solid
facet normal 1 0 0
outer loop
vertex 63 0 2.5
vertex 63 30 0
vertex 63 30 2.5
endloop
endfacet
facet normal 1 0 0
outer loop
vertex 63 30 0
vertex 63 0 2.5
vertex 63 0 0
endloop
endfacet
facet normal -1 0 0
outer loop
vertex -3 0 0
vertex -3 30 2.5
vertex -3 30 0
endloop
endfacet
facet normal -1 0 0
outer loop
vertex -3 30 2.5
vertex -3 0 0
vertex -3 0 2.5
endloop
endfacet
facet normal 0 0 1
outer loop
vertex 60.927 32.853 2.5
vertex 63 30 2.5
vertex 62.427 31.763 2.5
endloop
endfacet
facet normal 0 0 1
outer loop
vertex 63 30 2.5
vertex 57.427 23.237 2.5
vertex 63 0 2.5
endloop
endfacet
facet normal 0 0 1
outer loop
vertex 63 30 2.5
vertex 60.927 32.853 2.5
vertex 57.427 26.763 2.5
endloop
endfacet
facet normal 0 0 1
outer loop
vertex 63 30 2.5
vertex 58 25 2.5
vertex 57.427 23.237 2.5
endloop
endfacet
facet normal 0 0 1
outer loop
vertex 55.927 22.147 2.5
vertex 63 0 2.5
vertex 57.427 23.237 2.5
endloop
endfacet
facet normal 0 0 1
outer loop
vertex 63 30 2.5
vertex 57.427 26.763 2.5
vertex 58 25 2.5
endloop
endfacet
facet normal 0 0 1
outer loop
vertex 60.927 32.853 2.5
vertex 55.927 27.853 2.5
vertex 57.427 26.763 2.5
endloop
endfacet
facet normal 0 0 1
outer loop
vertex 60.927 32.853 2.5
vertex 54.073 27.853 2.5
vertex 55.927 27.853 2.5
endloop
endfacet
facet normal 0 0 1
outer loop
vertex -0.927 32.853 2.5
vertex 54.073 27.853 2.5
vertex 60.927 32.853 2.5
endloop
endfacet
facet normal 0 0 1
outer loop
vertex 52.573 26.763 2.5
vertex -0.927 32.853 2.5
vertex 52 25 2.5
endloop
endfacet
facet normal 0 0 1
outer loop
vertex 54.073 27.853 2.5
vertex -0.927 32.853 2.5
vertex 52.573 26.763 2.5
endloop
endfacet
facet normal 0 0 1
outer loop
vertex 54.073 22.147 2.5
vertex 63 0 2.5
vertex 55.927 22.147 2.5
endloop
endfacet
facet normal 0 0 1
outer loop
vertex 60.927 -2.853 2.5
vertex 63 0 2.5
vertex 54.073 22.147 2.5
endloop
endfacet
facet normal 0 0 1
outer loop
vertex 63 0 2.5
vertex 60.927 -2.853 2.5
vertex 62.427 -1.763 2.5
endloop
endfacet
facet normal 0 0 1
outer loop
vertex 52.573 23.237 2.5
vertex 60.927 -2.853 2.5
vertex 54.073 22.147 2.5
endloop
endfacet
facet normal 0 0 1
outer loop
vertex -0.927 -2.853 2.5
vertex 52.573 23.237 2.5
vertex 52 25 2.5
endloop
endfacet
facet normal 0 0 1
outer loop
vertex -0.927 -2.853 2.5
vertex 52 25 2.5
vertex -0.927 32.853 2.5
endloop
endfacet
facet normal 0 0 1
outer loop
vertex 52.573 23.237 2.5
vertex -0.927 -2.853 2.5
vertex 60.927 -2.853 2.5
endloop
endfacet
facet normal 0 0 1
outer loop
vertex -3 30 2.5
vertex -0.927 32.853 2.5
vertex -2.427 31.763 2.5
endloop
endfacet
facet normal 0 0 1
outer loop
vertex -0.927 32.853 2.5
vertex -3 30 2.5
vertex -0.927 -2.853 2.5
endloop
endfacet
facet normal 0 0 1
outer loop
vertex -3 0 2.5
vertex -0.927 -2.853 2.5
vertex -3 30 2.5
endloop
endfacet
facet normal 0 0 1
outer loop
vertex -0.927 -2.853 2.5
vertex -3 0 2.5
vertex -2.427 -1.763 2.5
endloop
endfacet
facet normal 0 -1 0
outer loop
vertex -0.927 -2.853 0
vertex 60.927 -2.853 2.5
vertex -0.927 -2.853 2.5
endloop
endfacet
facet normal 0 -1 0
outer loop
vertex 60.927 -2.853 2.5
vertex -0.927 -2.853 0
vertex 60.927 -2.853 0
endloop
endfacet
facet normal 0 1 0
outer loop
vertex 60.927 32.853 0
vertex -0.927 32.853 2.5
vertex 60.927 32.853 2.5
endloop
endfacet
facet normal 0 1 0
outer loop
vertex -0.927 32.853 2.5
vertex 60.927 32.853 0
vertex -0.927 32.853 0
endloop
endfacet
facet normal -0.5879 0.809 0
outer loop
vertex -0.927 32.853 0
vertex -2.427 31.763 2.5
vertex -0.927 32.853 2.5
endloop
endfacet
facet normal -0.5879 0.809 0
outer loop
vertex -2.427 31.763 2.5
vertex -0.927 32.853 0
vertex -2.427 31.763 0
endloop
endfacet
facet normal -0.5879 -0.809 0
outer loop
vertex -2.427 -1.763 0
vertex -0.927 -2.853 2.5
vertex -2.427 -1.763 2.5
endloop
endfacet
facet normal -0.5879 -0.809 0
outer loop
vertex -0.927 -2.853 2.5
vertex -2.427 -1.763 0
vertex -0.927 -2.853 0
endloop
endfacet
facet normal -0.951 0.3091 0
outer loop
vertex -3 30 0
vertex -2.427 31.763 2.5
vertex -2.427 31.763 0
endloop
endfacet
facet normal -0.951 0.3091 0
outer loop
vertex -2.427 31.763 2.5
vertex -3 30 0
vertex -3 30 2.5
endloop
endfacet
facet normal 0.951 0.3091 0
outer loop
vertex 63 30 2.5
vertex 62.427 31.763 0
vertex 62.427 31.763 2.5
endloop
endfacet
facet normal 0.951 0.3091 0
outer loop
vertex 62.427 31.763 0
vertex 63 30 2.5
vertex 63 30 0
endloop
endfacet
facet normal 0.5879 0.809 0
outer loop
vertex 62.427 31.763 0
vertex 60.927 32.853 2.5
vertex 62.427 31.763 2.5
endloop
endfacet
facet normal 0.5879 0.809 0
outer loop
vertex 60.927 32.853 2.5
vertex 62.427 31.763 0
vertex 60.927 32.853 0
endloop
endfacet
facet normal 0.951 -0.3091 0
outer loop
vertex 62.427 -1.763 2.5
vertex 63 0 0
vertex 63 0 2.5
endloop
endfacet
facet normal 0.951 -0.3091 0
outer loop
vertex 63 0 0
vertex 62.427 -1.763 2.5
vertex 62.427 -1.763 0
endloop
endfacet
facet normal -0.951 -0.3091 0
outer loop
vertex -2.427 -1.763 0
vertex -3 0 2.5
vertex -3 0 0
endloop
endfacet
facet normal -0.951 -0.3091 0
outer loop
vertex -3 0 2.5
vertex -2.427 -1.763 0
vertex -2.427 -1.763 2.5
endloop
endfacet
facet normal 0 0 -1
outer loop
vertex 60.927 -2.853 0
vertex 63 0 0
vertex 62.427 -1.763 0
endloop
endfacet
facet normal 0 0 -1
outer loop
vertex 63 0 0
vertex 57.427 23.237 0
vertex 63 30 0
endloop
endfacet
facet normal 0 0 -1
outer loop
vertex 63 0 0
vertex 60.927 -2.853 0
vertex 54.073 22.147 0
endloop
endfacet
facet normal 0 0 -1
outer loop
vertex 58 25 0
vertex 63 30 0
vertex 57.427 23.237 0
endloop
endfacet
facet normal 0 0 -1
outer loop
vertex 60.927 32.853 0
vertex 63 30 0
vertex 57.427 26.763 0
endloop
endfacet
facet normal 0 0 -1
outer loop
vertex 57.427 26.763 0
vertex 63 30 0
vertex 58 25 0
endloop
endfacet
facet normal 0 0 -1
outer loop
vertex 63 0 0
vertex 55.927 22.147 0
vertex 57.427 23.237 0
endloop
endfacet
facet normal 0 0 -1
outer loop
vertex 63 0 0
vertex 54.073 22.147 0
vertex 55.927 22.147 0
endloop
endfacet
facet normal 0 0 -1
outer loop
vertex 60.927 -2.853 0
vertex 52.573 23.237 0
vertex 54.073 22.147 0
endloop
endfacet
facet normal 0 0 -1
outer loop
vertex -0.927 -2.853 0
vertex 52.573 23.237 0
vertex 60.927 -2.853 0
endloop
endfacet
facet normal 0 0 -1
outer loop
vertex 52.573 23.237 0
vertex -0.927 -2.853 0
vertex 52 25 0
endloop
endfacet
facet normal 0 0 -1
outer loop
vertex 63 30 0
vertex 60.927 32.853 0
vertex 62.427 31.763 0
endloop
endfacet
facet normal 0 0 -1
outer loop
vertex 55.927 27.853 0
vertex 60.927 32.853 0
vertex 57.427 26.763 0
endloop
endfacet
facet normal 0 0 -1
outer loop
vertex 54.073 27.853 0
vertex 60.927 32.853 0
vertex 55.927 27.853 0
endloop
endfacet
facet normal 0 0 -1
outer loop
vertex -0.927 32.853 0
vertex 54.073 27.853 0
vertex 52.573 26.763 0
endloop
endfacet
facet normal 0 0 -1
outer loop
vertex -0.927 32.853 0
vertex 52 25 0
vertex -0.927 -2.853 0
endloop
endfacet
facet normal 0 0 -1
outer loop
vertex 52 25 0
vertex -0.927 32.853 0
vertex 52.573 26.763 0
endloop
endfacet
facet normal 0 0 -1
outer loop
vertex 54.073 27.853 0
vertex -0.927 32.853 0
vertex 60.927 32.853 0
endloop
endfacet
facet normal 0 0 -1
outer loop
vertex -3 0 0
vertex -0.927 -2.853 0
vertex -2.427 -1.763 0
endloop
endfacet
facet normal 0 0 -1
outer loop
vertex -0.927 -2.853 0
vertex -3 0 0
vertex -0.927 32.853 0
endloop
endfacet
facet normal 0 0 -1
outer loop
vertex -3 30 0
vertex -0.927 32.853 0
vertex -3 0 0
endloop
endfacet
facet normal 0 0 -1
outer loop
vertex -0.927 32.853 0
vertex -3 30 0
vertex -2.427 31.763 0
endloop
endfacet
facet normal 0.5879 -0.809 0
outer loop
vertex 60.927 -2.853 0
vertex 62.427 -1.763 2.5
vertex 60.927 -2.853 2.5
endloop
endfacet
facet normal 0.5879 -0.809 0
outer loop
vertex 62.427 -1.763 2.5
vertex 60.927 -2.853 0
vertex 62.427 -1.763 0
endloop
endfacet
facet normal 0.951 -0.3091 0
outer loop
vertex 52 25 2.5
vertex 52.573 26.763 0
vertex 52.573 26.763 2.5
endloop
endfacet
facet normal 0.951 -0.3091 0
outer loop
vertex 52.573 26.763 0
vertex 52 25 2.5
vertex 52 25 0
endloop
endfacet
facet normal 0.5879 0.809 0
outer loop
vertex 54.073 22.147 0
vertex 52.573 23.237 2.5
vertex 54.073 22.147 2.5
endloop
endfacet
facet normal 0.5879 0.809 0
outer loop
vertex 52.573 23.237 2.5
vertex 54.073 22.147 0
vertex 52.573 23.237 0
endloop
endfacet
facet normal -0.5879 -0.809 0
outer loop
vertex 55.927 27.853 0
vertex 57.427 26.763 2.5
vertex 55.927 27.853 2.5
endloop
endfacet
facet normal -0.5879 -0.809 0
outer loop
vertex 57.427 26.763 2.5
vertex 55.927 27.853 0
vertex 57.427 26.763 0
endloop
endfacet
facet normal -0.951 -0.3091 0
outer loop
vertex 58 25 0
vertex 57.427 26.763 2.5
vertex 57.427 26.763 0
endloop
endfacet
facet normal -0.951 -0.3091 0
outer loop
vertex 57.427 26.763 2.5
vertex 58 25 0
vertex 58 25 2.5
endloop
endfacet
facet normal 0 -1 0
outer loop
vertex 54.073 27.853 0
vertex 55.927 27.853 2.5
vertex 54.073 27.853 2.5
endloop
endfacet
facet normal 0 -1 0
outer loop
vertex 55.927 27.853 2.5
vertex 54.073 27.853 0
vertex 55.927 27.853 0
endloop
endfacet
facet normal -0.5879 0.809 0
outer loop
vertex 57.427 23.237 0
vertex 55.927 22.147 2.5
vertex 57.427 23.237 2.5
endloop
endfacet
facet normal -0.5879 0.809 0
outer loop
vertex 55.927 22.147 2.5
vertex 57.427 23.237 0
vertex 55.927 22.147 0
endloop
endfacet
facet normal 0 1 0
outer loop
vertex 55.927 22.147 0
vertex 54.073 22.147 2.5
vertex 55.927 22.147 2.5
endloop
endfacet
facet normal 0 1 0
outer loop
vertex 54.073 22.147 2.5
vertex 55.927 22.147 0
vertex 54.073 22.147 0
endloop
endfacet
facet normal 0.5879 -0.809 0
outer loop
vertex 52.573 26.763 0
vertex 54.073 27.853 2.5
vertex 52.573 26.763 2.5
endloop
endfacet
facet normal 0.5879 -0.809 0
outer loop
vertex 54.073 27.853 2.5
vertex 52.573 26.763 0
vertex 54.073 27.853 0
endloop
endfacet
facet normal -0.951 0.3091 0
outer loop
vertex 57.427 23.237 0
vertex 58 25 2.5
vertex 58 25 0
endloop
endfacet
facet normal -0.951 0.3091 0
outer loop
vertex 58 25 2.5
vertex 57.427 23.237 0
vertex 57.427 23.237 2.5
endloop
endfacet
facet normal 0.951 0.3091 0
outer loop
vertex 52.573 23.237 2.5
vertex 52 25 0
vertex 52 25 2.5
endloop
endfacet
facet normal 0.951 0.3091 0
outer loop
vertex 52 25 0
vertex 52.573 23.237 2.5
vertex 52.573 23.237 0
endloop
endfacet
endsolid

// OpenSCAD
difference() {
	minkowski() {
 		cube([60,30,1.5]);
	    cylinder(r=3,h=1);
	}
	translate([4,5,0])
		scale([0.5, 0.5, 1])
		linear_extrude(height=2.5)
		  import("eline-tag.dxf");
	translate([55, 25, 0])
		cylinder(h=2.5, r=3);
}
